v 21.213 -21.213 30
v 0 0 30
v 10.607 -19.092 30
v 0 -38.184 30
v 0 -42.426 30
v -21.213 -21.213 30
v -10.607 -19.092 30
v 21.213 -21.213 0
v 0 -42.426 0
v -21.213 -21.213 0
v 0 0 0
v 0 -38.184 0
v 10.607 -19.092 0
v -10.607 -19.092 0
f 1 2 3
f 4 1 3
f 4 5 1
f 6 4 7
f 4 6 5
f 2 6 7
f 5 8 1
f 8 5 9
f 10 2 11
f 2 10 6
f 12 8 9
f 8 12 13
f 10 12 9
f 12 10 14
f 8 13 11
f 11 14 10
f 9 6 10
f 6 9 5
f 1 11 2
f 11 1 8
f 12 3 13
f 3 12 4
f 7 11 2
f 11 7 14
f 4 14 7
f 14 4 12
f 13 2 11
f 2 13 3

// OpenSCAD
rotate([0,0,180])
rotate([0,-90,0]){
    difference(){
        rotate([-45,0,0]) {
            cube([30, 30, 30]);
        }
        scale([1,0.9,0.5]) {
            rotate([-45,0,0]) {
                cube([30, 30, 30]);
            }
        }
    }
}
